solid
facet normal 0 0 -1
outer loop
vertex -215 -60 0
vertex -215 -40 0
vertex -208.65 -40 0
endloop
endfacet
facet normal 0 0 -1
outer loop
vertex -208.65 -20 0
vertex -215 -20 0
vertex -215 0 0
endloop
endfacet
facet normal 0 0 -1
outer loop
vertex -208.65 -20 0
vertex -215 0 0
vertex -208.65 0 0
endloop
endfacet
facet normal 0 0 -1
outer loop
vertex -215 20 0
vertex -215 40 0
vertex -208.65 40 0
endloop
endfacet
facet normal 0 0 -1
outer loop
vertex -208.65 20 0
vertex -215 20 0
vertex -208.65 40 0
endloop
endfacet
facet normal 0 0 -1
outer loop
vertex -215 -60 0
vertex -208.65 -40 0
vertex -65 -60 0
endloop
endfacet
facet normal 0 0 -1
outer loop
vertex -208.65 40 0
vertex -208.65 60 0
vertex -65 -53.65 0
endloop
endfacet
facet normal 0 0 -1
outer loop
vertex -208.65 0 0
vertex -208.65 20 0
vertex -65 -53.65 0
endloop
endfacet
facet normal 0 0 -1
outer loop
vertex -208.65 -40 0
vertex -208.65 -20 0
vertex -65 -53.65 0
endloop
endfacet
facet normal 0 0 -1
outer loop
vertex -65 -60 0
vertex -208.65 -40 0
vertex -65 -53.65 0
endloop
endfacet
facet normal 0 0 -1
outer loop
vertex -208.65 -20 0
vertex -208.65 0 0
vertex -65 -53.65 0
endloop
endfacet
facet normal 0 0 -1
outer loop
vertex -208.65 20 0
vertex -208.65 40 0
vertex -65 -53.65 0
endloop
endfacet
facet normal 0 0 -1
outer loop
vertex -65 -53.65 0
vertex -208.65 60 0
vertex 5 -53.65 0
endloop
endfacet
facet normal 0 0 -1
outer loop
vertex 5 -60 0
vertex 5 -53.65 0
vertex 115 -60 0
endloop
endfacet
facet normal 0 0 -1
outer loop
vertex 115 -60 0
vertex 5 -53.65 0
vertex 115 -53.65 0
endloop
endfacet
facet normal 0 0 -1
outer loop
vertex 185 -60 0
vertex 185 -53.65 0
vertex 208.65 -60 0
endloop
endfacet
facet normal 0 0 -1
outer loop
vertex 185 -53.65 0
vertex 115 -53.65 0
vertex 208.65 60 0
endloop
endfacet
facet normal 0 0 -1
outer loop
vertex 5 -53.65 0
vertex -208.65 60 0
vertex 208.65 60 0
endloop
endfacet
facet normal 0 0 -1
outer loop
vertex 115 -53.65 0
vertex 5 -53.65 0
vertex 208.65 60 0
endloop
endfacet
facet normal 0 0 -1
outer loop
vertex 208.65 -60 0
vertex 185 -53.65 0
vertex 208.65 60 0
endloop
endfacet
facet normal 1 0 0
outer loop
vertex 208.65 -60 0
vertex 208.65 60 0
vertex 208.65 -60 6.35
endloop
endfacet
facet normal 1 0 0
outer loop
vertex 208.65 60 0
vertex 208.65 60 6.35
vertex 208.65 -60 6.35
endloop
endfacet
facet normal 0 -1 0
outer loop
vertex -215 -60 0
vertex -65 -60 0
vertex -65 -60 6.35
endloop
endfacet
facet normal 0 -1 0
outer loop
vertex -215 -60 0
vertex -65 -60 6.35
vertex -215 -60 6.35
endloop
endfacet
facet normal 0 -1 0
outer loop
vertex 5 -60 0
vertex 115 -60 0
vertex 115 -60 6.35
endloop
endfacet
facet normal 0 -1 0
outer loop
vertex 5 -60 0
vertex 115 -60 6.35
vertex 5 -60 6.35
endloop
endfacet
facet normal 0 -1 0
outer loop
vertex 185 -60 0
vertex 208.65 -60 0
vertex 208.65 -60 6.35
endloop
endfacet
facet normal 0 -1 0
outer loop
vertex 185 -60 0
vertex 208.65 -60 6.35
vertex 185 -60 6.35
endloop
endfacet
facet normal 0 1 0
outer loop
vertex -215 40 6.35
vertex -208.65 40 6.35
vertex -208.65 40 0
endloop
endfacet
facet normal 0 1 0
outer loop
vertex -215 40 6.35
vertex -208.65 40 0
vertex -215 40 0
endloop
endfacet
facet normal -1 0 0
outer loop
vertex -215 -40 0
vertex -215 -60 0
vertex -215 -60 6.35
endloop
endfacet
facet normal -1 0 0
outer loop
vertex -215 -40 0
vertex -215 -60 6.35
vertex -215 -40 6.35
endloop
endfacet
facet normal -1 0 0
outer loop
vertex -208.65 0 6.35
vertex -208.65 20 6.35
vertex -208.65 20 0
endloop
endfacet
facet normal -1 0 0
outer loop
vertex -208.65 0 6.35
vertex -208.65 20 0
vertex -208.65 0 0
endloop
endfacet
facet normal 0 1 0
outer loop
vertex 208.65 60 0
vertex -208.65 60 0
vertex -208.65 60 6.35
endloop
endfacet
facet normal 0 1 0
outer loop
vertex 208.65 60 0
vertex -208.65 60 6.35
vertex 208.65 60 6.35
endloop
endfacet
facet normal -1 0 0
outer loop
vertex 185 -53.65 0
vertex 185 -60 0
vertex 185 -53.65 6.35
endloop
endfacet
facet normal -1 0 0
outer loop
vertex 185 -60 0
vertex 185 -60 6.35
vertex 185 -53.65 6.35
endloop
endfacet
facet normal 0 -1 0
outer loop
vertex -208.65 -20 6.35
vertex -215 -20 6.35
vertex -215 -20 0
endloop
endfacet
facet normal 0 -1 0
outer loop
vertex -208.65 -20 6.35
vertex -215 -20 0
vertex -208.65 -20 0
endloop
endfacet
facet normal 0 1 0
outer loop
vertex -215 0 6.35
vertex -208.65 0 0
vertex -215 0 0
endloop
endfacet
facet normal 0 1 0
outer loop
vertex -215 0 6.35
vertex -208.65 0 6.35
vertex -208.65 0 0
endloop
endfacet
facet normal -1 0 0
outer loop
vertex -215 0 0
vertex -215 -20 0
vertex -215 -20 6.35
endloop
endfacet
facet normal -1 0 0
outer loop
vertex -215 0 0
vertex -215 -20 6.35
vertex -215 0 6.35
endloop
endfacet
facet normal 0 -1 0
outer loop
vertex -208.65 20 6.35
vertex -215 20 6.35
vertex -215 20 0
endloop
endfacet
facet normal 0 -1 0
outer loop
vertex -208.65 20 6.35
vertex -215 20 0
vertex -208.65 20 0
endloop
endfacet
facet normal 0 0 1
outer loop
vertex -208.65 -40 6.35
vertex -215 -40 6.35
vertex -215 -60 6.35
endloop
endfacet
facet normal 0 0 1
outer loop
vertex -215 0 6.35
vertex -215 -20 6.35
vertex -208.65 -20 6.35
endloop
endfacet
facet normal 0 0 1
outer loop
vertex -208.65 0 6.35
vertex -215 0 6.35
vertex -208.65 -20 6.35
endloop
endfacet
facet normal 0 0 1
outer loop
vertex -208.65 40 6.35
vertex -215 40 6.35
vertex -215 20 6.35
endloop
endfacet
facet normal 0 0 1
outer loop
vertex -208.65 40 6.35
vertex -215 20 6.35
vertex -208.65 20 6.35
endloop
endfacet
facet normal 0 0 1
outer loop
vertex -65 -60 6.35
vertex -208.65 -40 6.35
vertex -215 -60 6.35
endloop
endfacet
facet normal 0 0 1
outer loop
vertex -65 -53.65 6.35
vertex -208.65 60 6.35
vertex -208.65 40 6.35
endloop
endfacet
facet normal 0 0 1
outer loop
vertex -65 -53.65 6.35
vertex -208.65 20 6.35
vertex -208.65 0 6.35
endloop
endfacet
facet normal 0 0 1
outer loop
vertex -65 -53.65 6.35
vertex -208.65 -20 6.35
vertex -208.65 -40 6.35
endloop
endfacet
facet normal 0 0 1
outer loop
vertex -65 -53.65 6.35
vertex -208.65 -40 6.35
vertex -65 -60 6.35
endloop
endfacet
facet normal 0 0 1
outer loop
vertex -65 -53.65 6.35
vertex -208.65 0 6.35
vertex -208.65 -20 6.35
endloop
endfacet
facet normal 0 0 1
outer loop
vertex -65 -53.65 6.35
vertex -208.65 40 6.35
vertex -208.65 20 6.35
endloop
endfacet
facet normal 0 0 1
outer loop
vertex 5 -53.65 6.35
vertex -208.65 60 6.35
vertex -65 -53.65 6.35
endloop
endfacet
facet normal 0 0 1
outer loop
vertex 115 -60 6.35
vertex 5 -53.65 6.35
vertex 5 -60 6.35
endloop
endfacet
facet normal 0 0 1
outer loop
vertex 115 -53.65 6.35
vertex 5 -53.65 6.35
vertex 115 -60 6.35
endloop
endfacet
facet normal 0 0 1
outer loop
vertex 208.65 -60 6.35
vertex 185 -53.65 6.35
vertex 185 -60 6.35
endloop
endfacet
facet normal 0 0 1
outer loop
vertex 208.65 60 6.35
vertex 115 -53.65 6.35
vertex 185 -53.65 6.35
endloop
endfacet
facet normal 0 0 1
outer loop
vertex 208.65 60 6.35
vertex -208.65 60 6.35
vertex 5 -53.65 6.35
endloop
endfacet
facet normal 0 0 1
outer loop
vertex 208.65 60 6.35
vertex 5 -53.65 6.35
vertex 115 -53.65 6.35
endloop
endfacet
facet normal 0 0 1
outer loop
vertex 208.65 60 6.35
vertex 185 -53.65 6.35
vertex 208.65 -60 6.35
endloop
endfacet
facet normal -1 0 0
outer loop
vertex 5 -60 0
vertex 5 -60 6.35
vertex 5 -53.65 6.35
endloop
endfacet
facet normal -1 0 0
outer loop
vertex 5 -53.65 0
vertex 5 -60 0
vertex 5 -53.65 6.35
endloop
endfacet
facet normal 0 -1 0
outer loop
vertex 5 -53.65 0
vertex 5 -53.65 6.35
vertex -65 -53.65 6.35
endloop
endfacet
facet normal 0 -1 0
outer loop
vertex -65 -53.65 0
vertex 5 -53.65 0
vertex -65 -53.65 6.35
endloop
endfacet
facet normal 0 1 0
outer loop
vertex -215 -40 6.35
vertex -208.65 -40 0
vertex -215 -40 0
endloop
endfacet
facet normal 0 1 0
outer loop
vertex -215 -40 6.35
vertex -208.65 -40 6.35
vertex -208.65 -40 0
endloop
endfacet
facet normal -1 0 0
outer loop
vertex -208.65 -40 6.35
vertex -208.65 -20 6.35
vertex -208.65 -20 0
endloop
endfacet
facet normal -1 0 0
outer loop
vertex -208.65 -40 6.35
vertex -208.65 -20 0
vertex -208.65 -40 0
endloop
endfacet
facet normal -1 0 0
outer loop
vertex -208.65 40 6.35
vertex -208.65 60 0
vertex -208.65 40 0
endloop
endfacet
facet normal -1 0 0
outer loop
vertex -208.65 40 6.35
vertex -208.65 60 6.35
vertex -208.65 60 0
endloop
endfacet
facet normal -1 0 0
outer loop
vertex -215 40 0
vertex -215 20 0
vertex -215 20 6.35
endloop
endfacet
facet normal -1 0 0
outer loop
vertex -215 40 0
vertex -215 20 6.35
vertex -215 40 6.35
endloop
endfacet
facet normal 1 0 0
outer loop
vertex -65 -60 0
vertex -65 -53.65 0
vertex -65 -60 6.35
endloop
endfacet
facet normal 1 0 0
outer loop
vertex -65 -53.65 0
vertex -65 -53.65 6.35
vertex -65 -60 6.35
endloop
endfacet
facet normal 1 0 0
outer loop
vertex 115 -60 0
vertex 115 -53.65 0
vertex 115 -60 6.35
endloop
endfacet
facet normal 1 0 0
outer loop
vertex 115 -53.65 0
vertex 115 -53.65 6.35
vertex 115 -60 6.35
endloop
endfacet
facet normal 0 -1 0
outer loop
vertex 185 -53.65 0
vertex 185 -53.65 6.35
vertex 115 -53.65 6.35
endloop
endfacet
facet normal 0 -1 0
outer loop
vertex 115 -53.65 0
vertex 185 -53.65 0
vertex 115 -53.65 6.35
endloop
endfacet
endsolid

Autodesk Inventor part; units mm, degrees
ref_plane "YZ Plane" through (0, 0, 0) normal (1, 0, 0) x (0, 1, 0)
ref_plane "XZ Plane" through (0, 0, 0) normal (0, 1, 0) x (-1, 0, 0)
ref_plane "XY Plane" through (0, 0, 0) normal (0, 0, 1) x (1, 0, 0)
sketch "Sketch1" plane through (0, 0, 0) normal (0, 0, 1) x (1, 0, 0)
  line L0 (-215, 60) -> (215, 60)
  line L1 (215, 60) -> (215, -60)
  line L2 (215, -60) -> (-215, -60)
  line L3 (-215, -60) -> (-215, 60)
  point P0 (0, 0)
  dimension "d0" = 120
  dimension "d1" = 430
  dimension "d2" = 215
  dimension "d3" = 60
extrude "Extrusion1" add sketch "Sketch1" along normal blind 6.35
sketch "Sketch2" plane through (0, 0, 6.35) normal (0, 0, 1) x (1, 0, 0)
  line L0 (215, 60) -> (-215, 60) projected
  line L1 (-215, 60) -> (-208.65, 60)
  line L2 (-208.65, 60) -> (-208.65, 40)
  line L3 (-208.65, 40) -> (-215, 40)
  line L4 (-215, 40) -> (-215, 60)
  line L5 (-215, 60) -> (-215, -60) projected
  line L6 (-215, 20) -> (-208.65, 20)
  line L7 (-208.65, 20) -> (-208.65, 0)
  line L8 (-208.65, 0) -> (-215, 0)
  line L9 (-215, 0) -> (-215, 20)
  line L10 (-215, -20) -> (-208.65, -20)
  line L11 (-208.65, -20) -> (-208.65, -40)
  line L12 (-208.65, -40) -> (-215, -40)
  line L13 (-215, -40) -> (-215, -20)
  line L14 (-215, -60) -> (-215, -55)
  line L15 (215, 60) -> (208.65, 60)
  line L16 (208.65, 60) -> (208.65, 40)
  line L17 (208.65, 40) -> (215, 40)
  line L18 (215, 40) -> (215, 60)
  line L19 (215, -60) -> (215, 60) projected
  line L20 (215, 20) -> (208.65, 20)
  line L21 (208.65, 20) -> (208.65, 0)
  line L22 (208.65, 0) -> (215, 0)
  line L23 (215, 0) -> (215, 20)
  line L24 (215, -20) -> (208.65, -20)
  line L25 (208.65, -20) -> (208.65, -40)
  line L26 (208.65, -40) -> (215, -40)
  line L27 (215, -40) -> (215, -20)
  line L28 (215, -60) -> (215, 60) projected
  line L29 (215, -60) -> (215, -55)
  point P0 (0, 0)
  point P1 (208.65, -60)
  dimension "d6" = 6.35
  dimension "d7" = 20
  dimension "d8" = 20
  dimension "d9" = 20
  dimension "d10" = 20
  dimension "d11" = 20
  dimension "d13" = 20
  dimension "d14" = 20
  dimension "d15" = 20
  dimension "d16" = 20
  dimension "d17" = 20
  dimension "d19" = 6.35
extrude "Extrusion2" cut sketch "Sketch2" against normal through all
sketch "Sketch3" plane through (0, 0, 6.35) normal (0, 0, 1) x (1, 0, 0)
  line L0 (-215, -60) -> (215, -60) projected
  line L1 (-65, -60) -> (5, -60)
  line L2 (5, -60) -> (5, -53.65)
  line L3 (5, -53.65) -> (-65, -53.65)
  line L4 (-65, -53.65) -> (-65, -60)
  line L5 (115, -60) -> (185, -60)
  line L6 (185, -60) -> (185, -53.65)
  line L7 (185, -53.65) -> (115, -53.65)
  line L8 (115, -53.65) -> (115, -60)
  point P0 (0, 0)
  point P1 (-268.65, -60)
  point P2 (268.65, -60)
  point P3 (185, -60)
  dimension "d22" = 70
  dimension "d23" = 70
  dimension "d25" = 110
  dimension "d26" = 6.35
  dimension "d27" = 6.35
  dimension "d30" = 150
extrude "Extrusion3" cut sketch "Sketch3" against normal through all
sketch "Sketch4" plane through (0, 0, 6.35) normal (0, 0, 1) x (1, 0, 0)
  line L0 (208.65, 60) -> (-208.65, 60) projected
  line L1 (208.65, 60) -> (215, 60)
  line L2 (215, 60) -> (215, -60)
  line L3 (215, -60) -> (208.65, -60)
  line L4 (208.65, -60) -> (208.65, 60)
  line L5 (185, -53.65) -> (185, -60) construction
  line L6 (185, -60) -> (215, -60) construction
  line L7 (215, -60) -> (215, -40) construction
  line L8 (215, -40) -> (208.65, -40) construction
  line L9 (208.65, -40) -> (208.65, -20) construction
  line L10 (208.65, -20) -> (215, -20) construction
  line L11 (215, -20) -> (215, 0) construction
  line L12 (215, 0) -> (208.65, 0) construction
  line L13 (208.65, 0) -> (208.65, 20) construction
  line L14 (208.65, 20) -> (215, 20) construction
  line L15 (215, 20) -> (215, 40) construction
  line L16 (215, 40) -> (208.65, 40) construction
  line L17 (208.65, 40) -> (208.65, 60) construction
  line L18 (208.65, 60) -> (-208.65, 60) projected
  line L19 (-208.65, 60) -> (-208.65, 40) projected
  line L20 (-208.65, 40) -> (-215, 40) projected
  line L21 (-215, 40) -> (-215, 20) projected
  line L22 (-215, 20) -> (-208.65, 20) projected
  line L23 (-208.65, 20) -> (-208.65, 0) projected
  line L24 (-208.65, 0) -> (-215, 0) projected
  line L25 (-215, 0) -> (-215, -20) projected
  line L26 (-215, -20) -> (-208.65, -20) projected
  line L27 (-208.65, -20) -> (-208.65, -40) projected
  line L28 (-208.65, -40) -> (-215, -40) projected
  line L29 (-215, -40) -> (-215, -60) projected
  line L30 (-215, -60) -> (-65, -60) projected
  line L31 (-65, -60) -> (-65, -53.65) projected
  line L32 (-65, -53.65) -> (5, -53.65) projected
  line L33 (5, -53.65) -> (5, -60) projected
  line L34 (5, -60) -> (115, -60) projected
  line L35 (115, -60) -> (115, -53.65) projected
  line L36 (115, -53.65) -> (185, -53.65) construction
  point P0 (0, 0)
  point P1 (211.825, -60)
extrude "Extrusion4" cut sketch "Sketch4" against normal through all
equation "\"d2\" = 0.5 * d1"
equation "\"d3\" = 0.5 * d0"
equation "\"d10\" = d8"
equation "\"d27\" = d26"
properties part number "2202_Housing Side_V1" material "Wood (Birch)"
